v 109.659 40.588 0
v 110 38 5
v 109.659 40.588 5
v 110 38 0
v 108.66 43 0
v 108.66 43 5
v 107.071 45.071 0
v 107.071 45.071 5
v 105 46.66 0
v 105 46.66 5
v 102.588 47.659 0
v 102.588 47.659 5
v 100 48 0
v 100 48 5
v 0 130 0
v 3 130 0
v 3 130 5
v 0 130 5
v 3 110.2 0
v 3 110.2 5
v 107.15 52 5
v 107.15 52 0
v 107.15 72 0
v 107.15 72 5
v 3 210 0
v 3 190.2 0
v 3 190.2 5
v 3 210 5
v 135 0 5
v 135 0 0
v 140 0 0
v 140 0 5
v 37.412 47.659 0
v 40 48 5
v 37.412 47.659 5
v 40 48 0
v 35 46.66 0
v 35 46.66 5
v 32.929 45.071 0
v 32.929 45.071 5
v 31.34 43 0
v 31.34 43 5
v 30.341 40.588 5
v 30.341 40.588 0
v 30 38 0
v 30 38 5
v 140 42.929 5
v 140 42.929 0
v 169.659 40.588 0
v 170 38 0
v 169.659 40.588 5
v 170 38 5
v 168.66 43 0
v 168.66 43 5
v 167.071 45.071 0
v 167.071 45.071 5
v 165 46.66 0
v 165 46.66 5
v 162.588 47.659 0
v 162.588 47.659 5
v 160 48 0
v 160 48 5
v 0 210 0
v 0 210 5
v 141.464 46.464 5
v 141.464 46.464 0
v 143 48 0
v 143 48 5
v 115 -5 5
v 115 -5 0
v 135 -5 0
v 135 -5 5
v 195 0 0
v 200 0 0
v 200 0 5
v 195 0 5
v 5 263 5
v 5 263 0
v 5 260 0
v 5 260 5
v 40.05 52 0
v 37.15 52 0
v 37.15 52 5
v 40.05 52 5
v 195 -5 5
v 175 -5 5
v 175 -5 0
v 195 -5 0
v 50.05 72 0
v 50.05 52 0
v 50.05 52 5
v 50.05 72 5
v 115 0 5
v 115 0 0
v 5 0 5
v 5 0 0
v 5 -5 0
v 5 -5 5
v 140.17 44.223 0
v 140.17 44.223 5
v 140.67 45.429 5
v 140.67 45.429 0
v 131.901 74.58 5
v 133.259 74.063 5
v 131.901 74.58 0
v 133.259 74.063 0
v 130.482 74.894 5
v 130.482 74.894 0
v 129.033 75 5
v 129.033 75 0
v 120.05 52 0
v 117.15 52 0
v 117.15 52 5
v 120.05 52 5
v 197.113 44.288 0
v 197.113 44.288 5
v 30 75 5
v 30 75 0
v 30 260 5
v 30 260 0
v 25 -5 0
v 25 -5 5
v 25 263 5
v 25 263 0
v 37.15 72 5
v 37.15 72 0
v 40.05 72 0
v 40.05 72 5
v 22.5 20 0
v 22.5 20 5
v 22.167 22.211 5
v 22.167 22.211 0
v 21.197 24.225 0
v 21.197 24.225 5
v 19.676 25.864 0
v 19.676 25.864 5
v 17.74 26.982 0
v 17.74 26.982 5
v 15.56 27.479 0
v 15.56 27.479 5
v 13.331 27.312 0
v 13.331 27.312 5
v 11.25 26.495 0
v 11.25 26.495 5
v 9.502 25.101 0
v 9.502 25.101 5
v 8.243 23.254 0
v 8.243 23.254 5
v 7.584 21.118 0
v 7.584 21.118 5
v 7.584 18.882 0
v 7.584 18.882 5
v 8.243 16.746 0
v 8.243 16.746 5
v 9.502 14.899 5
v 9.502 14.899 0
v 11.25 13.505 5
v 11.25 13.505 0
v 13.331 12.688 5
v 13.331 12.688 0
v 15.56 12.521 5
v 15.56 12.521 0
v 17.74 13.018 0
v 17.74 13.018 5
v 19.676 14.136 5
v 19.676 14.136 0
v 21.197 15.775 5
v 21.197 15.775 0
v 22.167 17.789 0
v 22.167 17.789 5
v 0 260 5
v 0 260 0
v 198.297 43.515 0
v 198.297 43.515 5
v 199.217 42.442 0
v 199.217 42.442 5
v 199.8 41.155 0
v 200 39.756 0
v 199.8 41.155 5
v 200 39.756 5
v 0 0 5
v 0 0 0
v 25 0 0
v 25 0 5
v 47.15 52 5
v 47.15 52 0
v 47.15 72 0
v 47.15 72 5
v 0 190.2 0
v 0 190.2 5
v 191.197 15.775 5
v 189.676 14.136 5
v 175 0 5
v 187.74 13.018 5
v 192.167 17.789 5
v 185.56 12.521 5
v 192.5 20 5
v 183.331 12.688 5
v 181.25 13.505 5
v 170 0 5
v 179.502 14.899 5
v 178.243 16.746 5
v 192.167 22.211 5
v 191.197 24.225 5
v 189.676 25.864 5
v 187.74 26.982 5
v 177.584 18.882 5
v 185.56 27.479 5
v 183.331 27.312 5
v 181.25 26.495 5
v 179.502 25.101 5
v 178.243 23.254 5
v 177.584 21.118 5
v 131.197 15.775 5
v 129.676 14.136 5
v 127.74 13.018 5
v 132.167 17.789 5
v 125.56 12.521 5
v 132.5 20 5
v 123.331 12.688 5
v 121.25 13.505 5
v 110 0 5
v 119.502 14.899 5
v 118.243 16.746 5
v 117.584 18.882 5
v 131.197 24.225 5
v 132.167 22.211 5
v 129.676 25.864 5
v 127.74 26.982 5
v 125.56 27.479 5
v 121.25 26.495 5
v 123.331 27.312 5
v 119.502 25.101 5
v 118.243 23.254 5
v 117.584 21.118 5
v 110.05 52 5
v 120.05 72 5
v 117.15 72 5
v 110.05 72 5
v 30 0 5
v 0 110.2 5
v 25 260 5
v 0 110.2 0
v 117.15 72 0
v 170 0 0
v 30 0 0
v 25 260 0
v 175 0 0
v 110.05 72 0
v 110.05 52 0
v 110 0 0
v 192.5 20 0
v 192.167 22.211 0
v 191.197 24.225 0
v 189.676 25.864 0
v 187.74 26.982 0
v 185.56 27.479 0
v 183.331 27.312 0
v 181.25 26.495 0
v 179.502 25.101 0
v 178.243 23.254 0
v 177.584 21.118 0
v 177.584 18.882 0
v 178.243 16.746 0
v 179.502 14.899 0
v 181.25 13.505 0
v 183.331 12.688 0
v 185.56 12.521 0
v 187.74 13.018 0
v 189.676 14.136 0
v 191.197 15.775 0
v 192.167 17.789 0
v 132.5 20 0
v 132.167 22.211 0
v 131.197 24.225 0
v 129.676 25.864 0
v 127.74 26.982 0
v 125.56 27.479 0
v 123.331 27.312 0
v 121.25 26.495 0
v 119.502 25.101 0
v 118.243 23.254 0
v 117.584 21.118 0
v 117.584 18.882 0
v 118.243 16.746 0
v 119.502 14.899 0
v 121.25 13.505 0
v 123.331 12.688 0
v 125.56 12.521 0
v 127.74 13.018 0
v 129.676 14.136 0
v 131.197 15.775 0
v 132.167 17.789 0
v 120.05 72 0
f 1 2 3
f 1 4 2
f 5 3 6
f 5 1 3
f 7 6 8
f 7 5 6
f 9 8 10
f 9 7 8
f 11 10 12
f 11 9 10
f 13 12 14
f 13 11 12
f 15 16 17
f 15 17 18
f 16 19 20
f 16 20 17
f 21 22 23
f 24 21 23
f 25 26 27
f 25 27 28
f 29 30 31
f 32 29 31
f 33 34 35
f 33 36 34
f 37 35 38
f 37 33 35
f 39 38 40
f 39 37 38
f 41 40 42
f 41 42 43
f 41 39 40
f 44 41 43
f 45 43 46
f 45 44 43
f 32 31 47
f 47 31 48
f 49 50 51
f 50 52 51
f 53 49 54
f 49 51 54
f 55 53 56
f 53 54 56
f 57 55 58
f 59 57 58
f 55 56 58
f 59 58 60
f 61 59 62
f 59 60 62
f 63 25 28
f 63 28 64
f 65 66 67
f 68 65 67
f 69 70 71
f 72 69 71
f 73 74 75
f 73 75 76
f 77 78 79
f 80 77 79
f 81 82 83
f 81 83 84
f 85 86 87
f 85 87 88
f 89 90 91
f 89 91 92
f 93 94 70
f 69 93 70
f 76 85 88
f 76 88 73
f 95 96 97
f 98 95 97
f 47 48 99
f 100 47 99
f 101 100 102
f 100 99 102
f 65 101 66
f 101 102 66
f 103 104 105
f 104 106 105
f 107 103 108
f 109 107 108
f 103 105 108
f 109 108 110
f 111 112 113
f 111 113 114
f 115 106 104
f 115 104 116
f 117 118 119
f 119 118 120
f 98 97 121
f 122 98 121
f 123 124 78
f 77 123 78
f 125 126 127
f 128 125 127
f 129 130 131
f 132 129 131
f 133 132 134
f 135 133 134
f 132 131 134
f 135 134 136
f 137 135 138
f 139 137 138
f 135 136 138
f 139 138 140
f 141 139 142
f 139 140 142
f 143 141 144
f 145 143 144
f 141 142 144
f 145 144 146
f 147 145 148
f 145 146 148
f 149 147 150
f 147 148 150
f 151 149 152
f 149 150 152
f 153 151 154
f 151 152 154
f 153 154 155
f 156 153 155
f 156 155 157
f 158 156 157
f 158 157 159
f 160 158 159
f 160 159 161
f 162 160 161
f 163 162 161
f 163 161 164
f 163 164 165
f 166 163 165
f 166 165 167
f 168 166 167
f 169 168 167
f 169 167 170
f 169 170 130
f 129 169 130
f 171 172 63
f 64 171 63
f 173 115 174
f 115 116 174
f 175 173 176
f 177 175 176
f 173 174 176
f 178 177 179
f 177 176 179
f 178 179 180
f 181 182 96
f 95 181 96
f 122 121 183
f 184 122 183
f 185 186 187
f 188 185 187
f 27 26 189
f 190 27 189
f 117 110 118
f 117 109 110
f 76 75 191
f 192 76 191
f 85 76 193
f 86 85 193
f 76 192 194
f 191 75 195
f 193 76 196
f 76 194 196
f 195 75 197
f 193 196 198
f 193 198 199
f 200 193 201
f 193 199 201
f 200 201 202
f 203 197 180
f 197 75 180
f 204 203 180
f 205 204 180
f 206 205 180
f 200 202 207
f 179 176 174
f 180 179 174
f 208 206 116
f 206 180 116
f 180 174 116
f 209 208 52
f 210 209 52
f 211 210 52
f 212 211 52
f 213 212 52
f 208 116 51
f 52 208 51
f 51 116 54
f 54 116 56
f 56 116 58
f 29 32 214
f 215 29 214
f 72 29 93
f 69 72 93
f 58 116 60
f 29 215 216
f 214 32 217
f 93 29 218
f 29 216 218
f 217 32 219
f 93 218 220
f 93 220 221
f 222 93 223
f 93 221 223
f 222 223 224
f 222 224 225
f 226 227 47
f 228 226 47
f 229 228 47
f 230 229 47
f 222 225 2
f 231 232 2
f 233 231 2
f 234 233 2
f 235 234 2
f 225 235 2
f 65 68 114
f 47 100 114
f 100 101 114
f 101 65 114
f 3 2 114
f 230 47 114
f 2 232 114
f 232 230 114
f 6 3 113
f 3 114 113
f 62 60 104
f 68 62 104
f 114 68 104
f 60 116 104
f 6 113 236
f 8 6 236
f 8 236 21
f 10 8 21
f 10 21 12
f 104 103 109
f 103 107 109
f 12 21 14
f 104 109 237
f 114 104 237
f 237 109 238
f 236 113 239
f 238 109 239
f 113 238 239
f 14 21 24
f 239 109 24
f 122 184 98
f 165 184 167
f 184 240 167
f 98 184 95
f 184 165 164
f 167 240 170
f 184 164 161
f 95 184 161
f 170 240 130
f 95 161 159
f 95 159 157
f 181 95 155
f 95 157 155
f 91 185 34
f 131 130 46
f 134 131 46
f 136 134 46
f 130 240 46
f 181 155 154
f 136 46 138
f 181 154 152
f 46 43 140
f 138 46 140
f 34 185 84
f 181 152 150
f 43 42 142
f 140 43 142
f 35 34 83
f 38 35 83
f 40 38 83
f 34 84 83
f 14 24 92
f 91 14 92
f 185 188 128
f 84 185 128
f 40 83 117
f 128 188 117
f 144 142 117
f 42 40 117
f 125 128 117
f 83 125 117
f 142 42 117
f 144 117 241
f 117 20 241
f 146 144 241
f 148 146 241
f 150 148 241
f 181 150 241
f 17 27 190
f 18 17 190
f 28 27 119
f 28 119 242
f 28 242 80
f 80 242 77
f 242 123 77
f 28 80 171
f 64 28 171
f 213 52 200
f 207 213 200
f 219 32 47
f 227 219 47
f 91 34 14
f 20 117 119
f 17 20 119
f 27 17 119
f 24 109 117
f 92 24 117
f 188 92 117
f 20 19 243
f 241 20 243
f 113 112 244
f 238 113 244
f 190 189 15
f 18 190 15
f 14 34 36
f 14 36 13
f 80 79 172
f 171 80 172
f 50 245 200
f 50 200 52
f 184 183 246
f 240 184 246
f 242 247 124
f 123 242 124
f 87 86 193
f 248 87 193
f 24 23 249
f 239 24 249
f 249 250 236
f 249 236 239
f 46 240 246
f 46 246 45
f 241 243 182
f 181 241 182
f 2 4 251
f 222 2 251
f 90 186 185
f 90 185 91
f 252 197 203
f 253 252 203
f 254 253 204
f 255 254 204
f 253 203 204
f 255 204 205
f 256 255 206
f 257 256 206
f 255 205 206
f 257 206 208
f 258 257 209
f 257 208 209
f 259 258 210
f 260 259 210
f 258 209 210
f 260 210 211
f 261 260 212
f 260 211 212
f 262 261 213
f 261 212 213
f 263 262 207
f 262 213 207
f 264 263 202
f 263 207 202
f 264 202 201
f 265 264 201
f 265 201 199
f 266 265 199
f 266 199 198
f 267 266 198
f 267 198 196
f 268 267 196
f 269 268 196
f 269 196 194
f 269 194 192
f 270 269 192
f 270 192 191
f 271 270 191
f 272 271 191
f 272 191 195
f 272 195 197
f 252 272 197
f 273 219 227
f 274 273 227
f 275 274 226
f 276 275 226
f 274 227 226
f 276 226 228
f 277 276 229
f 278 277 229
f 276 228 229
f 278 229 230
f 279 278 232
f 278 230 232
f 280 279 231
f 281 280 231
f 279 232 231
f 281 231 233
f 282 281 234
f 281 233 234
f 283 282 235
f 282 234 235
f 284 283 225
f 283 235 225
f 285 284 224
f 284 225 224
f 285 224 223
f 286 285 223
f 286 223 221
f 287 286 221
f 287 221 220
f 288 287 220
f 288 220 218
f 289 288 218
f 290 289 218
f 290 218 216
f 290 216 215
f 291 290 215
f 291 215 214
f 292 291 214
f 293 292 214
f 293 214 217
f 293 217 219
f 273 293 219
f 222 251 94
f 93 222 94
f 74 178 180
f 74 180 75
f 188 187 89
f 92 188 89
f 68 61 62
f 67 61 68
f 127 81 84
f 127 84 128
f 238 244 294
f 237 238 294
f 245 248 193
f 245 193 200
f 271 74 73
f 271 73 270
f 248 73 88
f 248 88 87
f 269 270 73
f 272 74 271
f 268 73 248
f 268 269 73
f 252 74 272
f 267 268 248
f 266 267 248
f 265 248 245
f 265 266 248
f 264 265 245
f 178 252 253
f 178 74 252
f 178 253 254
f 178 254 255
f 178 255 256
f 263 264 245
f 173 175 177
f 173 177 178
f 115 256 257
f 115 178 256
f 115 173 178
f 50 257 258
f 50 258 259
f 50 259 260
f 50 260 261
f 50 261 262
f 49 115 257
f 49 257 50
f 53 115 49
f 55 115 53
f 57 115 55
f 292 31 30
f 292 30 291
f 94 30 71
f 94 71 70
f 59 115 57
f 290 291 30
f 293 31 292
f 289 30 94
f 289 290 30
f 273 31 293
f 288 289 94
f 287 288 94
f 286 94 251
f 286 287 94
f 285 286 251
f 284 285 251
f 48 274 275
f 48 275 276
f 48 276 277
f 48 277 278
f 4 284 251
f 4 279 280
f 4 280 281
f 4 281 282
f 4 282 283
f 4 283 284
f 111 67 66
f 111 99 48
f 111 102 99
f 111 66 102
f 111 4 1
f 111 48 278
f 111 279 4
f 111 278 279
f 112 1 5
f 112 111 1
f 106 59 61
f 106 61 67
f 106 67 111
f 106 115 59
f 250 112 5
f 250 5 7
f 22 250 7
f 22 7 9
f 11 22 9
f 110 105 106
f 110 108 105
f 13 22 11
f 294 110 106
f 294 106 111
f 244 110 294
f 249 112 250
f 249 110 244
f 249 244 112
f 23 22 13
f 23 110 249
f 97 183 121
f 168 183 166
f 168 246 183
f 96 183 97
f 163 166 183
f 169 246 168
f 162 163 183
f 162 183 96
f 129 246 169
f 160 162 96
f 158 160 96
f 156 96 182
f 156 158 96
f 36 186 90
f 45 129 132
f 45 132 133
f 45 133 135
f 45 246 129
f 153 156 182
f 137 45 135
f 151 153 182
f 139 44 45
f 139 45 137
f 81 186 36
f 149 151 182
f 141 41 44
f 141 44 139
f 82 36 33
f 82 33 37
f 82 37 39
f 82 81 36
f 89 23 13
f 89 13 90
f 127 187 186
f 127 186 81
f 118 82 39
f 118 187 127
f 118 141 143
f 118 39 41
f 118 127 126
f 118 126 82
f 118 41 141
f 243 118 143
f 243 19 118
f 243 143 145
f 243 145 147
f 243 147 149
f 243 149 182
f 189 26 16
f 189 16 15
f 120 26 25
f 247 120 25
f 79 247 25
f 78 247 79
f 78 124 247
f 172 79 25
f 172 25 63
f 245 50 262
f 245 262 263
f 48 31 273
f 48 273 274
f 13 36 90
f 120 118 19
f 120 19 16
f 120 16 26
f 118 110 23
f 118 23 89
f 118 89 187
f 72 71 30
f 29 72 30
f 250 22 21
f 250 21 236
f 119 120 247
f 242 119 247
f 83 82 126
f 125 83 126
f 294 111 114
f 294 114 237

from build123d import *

# Parameters (mm, degrees)
SKETCH1_W           = 2.9
SKETCH1_H           = 20
BOSS_EXTRUDE1_DEPTH = 5
CUT_EXTRUDE1_DEPTH  = 6
FILLET1_R           = 10
SKETCH3_W           = 3
SKETCH3_H           = 19.8
CUT_EXTRUDE2_DEPTH  = 5
LPATTERN1_COUNT     = 2
LPATTERN1_PITCH     = 80
CUT_EXTRUDE3_DEPTH  = 10
CUT_EXTRUDE4_DEPTH  = 5
BOSS_EXTRUDE2_DEPTH = 5
BOSS_EXTRUDE3_DEPTH = 5
FILLET3_R           = 10
FILLET4_R           = 5
SKETCH12_W          = 20
SKETCH12_H          = 5
BOSS_EXTRUDE4_DEPTH = 5
SKETCH13_R          = 7.5
CUT_EXTRUDE6_DEPTH  = 6


with BuildPart() as part:
    # Sketch1 → Boss-Extrude1 (new body)
    with BuildSketch(Plane.XY):
        with BuildLine():
            Line((155, 62.071067812), (155, 65.538881442))
            ThreePointArc((155, 65.538881442), (153.730862151, 68.867645118), (150.567732956, 70.506544805))
            Line((150.567732956, 70.506544805), (34.432267044, 83.779169481))
            ThreePointArc((34.432267044, 83.779169481), (31.269137849, 85.418069168), (30, 88.746832844))
            Line((30, 88.746832844), (30, 260))
            Line((30, 260), (25, 260))
            Line((25, 260), (25, 263))
            Line((25, 263), (5, 263))
            Line((5, 263), (5, 260))
            Line((5, 260), (0, 260))
            Line((0, 260), (0, 0))
            Line((0, 0), (5, 0))
            Line((5, 0), (5, -5))
            Line((5, -5), (25, -5))
            Line((25, -5), (25, 0))
            Line((25, 0), (30, 0))
            Line((30, 0), (30, 40))
            ThreePointArc((30, 40), (31.464466094, 43.535533906), (35, 45))
            Line((35, 45), (105, 45))
            ThreePointArc((105, 45), (108.535533906, 43.535533906), (110, 40))
            Line((110, 40), (110, 0))
            Line((110, 0), (115, 0))
            Line((115, 0), (115, -5))
            Line((115, -5), (135, -5))
            Line((135, -5), (135, 0))
            Line((135, 0), (140, 0))
            Line((140, 0), (140, 42.928932188))
            ThreePointArc((140, 42.928932188), (140.380602337, 44.84234935), (141.464466094, 46.464466094))
            Line((141.464466094, 46.464466094), (153.535533906, 58.535533906))
            ThreePointArc((153.535533906, 58.535533906), (154.619397663, 60.15765065), (155, 62.071067812))
        make_face()
        with Locations((38.6, 62)):
            Rectangle(SKETCH1_W, SKETCH1_H, mode=Mode.SUBTRACT)
        with Locations((48.6, 62)):
            Rectangle(SKETCH1_W, SKETCH1_H, mode=Mode.SUBTRACT)
        with Locations((118.6, 62)):
            Rectangle(SKETCH1_W, SKETCH1_H, mode=Mode.SUBTRACT)
        with Locations((108.6, 62)):
            Rectangle(SKETCH1_W, SKETCH1_H, mode=Mode.SUBTRACT)
    extrude(amount=BOSS_EXTRUDE1_DEPTH)

    # Sketch2 → Cut-Extrude1 (cut, through all)
    with BuildSketch(Plane.XY.offset(5)):
        with BuildLine():
            Line((30, 40), (30, 48))
            Line((30, 48), (110, 48))
            Line((110, 48), (110, 40))
            ThreePointArc((110, 40), (108.535533906, 43.535533906), (105, 45))
            Line((105, 45), (35, 45))
            ThreePointArc((35, 45), (31.464466094, 43.535533906), (30, 40))
        make_face()
    extrude(amount=-CUT_EXTRUDE1_DEPTH, mode=Mode.SUBTRACT)

    # Fillet1
    fillet1_edges = [part.edges().sort_by_distance(p)[0] for p in [
        (30, 48, 2.5),
        (110, 48, 2.5),
    ]]
    fillet(fillet1_edges, radius=FILLET1_R)

    # Sketch3 → Cut-Extrude2 (cut)
    with BuildSketch(Plane(origin=(0, 0, 0), x_dir=(-1, 0, 0), z_dir=(0, 0, -1))):
        with Locations((-1.5, 200.1)):
            Rectangle(SKETCH3_W, SKETCH3_H)
    cut_extrude2 = extrude(amount=-CUT_EXTRUDE2_DEPTH, mode=Mode.SUBTRACT)

    # LPattern1: Cut-Extrude2 ×2
    with Locations(*[(0, -i * LPATTERN1_PITCH, 0) for i in range(1, LPATTERN1_COUNT)]):
        add(cut_extrude2, mode=Mode.SUBTRACT)

    # Sketch4 → Cut-Extrude3 (cut)
    with BuildSketch(Plane.XY.offset(5)):
        with BuildLine():
            Line((30, 88.746832844), (30, 75))
            Line((30, 75), (111.25, 75))
            Line((111.25, 75), (34.432267044, 83.779169481))
            ThreePointArc((34.432267044, 83.779169481), (31.269137849, 85.418069168), (30, 88.746832844))
        make_face()
    extrude(amount=-CUT_EXTRUDE3_DEPTH, mode=Mode.SUBTRACT)

    # Sketch5 → Cut-Extrude4 (cut)
    with BuildSketch(Plane.XY.offset(5)):
        with BuildLine():
            Line((150.567732956, 70.506544805), (134.9100099, 72.295998869))
            Line((134.9100099, 72.295998869), (153.535533906, 58.535533906))
            ThreePointArc((153.535533906, 58.535533906), (154.619397663, 60.15765065), (155, 62.071067812))
            Line((155, 62.071067812), (155, 65.538881442))
            ThreePointArc((155, 65.538881442), (153.730862151, 68.867645118), (150.567732956, 70.506544805))
        make_face()
    extrude(amount=-CUT_EXTRUDE4_DEPTH, mode=Mode.SUBTRACT)

    # Sketch5<3> → Boss-Extrude2 (add)
    with BuildSketch(Plane.XY.offset(5)):
        Polygon((131.25, 75), (111.25, 75), (134.9100099, 72.295998869), align=None)
    extrude(amount=-BOSS_EXTRUDE2_DEPTH)

    # Sketch10 → Boss-Extrude3 (add)
    with BuildSketch(Plane(origin=(0, 0, 0), x_dir=(-1, 0, 0), z_dir=(0, 0, -1))):
        Polygon((-131.25, 75), (-200, 42.941348502), (-200, 0), (-170, 0), (-170, 48), (-143, 48), (-153.535533906, 58.535533906), align=None)
    extrude(amount=-BOSS_EXTRUDE3_DEPTH)

    # Fillet3
    fillet3_edges = [part.edges().sort_by_distance(p)[0] for p in [
        (131.25, 75, 2.5),
        (170, 48, 2.5),
    ]]
    fillet(fillet3_edges, radius=FILLET3_R)

    # Fillet4
    fillet4_edges = [part.edges().sort_by_distance(p)[0] for p in [
        (200, 42.941348502, 2.5),
    ]]
    fillet(fillet4_edges, radius=FILLET4_R)

    # Sketch12 → Boss-Extrude4 (add)
    with BuildSketch(Plane.XY.offset(5)):
        with Locations((185, -2.5)):
            Rectangle(SKETCH12_W, SKETCH12_H)
    extrude(amount=-BOSS_EXTRUDE4_DEPTH)

    # Sketch13 → Cut-Extrude6 (cut, through all)
    with BuildSketch(Plane.XY.offset(5)):
        with Locations((15, 20)):
            Circle(SKETCH13_R)
        with Locations((125, 20)):
            Circle(SKETCH13_R)
        with Locations((185, 20)):
            Circle(SKETCH13_R)
    extrude(amount=-CUT_EXTRUDE6_DEPTH, mode=Mode.SUBTRACT)


solid = part.part
